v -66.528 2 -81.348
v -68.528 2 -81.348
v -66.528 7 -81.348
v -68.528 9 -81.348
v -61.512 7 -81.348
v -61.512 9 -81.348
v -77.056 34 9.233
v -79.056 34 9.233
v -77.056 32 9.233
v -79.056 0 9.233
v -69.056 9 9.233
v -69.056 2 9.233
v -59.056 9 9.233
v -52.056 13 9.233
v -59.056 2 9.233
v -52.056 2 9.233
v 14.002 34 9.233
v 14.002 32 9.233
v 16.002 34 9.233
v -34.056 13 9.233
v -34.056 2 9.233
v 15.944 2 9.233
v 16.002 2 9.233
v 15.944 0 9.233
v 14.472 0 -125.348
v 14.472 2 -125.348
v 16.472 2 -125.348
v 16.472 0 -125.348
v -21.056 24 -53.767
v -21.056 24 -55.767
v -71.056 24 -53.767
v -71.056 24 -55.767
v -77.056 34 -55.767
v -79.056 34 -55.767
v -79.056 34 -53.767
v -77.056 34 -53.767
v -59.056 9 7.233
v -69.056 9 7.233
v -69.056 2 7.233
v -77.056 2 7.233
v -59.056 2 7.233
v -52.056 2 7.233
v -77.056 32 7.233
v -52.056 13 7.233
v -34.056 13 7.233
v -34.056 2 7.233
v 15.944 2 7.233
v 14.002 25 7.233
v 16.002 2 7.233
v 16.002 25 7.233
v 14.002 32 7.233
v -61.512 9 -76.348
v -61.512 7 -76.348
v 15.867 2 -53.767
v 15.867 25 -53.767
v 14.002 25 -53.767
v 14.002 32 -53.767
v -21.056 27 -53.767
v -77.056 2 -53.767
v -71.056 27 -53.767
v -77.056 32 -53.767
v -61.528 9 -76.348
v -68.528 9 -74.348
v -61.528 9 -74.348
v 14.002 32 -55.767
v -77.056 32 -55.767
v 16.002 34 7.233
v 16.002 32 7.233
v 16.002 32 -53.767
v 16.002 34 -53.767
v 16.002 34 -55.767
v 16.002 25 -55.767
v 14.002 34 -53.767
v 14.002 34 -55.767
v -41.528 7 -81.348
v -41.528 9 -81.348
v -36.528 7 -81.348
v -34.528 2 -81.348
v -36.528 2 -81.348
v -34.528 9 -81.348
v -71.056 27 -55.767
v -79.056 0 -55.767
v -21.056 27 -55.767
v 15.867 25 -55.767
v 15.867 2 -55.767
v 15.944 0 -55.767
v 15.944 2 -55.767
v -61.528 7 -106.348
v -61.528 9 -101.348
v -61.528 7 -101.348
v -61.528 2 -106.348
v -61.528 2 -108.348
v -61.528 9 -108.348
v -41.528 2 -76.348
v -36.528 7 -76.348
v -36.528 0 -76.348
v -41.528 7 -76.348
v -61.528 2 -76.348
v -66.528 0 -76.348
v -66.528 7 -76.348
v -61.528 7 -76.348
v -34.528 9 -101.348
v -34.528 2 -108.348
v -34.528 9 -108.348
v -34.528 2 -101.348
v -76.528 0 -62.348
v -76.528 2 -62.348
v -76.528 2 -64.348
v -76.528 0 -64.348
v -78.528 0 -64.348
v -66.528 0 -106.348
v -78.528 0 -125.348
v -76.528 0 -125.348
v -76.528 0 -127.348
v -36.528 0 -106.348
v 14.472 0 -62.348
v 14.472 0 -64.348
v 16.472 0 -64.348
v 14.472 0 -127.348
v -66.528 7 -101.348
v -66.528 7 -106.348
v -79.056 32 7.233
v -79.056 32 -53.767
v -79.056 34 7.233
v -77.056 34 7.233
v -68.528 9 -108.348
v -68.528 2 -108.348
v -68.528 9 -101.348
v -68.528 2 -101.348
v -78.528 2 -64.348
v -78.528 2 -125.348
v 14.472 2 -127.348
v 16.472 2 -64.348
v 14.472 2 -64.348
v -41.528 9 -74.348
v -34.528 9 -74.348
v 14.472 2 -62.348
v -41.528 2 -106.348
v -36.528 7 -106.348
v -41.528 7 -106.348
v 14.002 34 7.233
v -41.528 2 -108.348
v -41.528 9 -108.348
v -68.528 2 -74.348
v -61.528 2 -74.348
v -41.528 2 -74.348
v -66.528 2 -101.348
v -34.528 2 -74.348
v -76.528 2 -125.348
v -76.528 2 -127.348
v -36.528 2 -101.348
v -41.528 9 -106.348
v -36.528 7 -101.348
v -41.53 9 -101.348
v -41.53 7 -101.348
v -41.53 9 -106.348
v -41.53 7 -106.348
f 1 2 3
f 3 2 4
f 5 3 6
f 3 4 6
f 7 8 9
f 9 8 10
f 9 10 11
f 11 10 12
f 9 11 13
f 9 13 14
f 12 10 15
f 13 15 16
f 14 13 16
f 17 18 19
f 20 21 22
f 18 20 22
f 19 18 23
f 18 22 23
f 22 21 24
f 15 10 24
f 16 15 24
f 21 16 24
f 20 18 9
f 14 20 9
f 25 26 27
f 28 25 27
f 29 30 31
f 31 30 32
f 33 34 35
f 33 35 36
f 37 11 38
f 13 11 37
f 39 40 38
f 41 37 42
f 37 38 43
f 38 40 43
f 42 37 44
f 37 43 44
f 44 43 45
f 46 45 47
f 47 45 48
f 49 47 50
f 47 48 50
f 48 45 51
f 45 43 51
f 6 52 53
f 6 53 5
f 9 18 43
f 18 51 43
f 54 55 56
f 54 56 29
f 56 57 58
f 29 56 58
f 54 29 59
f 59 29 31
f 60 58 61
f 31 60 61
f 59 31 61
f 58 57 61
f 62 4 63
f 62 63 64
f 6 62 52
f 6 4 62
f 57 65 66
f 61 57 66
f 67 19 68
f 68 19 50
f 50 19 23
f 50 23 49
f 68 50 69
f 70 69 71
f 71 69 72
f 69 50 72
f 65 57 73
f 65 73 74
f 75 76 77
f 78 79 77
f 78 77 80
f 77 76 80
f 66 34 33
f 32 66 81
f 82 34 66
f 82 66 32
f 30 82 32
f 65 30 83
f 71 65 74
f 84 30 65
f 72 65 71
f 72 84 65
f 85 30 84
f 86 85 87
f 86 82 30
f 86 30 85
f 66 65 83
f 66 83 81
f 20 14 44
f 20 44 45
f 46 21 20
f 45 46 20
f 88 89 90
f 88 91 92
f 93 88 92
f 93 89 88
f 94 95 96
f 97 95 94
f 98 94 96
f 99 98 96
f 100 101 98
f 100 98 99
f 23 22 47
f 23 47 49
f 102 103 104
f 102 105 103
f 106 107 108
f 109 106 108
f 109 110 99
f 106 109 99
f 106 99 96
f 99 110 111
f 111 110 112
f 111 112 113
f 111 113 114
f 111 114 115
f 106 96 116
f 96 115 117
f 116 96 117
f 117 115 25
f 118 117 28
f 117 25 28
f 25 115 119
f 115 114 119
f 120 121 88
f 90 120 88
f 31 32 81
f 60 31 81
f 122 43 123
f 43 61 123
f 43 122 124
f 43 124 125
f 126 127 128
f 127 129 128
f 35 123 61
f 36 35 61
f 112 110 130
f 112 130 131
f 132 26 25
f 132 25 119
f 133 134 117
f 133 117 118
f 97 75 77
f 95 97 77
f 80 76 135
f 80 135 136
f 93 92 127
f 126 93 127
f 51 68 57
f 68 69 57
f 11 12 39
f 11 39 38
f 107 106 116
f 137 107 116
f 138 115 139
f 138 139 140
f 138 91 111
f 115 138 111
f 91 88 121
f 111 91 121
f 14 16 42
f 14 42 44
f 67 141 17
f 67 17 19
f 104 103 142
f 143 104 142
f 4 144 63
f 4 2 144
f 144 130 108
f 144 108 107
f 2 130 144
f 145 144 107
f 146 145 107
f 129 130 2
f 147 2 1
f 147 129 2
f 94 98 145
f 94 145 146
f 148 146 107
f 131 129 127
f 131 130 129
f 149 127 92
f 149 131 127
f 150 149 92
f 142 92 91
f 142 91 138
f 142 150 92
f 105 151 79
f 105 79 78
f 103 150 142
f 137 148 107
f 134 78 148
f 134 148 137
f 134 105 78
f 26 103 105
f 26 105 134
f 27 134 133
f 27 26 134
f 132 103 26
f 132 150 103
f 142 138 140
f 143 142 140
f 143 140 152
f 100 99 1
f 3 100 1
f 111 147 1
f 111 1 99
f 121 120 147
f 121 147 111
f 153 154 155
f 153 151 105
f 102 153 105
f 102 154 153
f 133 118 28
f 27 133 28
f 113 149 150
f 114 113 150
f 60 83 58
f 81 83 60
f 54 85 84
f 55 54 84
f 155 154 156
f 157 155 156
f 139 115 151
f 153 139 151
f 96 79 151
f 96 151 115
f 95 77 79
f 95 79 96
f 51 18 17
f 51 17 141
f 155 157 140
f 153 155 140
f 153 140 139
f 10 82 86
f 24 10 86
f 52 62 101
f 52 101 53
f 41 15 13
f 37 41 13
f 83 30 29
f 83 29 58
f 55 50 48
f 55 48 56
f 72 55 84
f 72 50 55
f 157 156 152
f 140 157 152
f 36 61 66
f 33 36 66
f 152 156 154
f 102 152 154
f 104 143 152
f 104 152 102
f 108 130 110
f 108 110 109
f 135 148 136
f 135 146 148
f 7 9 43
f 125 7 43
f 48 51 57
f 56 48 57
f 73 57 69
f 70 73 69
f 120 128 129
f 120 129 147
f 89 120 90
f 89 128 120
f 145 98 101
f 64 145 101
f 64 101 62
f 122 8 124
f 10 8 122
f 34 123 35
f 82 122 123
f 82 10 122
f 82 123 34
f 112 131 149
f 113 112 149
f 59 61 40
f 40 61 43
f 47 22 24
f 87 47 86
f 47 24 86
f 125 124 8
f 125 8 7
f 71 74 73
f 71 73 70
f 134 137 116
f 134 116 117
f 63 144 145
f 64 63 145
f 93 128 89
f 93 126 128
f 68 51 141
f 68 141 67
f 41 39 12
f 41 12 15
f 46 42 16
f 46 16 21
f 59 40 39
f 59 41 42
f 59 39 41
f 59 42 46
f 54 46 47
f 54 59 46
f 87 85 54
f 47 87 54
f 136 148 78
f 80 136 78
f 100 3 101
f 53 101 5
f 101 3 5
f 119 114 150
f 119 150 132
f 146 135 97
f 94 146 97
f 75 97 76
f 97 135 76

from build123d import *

# Parameters (mm, degrees)
ESQUISSE1_W                = 95
ESQUISSE1_H                = 65
BOSS_EXTRU_1_DEPTH         = 2
ESQUISSE22_W               = 65
ESQUISSE22_H               = 30
BOSS_EXTRU_6_DEPTH         = 2
ESQUISSE23_W               = 93.058073386
ESQUISSE23_H               = 30
BOSS_EXTRU_7_DEPTH         = 2
ESQUISSE26_W               = 92.923280672
ESQUISSE26_H               = 30
BOSS_EXTRU_8_DEPTH         = 2
ESQUISSE27_W               = 10
ESQUISSE27_H               = 7
ENL_V_MAT_EXTRU_4_DEPTH    = 2
ESQUISSE28_W               = 18
ESQUISSE28_H               = 11
ENL_V_MAT_EXTRU_5_DEPTH    = 2
ESQUISSE30_W               = 65
ESQUISSE30_H               = 7
BOSS_EXTRU_9_DEPTH         = 2
ESQUISSE31_W               = 95
ESQUISSE31_H               = 65
BOSS_EXTRU_11_DEPTH        = 2
ESQUISSE32_W               = 2
ESQUISSE32_H               = 2
BOSS_EXTRU_12_DEPTH        = 2
R_P_TITION_LIN_AIRE1_COUNT = 2
R_P_TITION_LIN_AIRE1_PITCH = 63
ESQUISSE33_W               = 2
ESQUISSE33_H               = 2
BOSS_EXTRU_13_DEPTH        = 2
R_P_TITION_LIN_AIRE4_COUNT = 2
R_P_TITION_LIN_AIRE4_PITCH = 63
ESQUISSE34_W               = 2
ESQUISSE34_H               = 2
ENL_V_MAT_EXTRU_6_DEPTH    = 2
R_P_TITION_LIN_AIRE5_COUNT = 2
R_P_TITION_LIN_AIRE5_PITCH = 63
ESQUISSE35_W               = 2
ESQUISSE35_H               = 2
ENL_V_MAT_EXTRU_7_DEPTH    = 2
R_P_TITION_LIN_AIRE7_COUNT = 2
R_P_TITION_LIN_AIRE7_PITCH = 63
ESQUISSE36_W               = 30
ESQUISSE36_H               = 30
ENL_V_MAT_EXTRU_8_DEPTH    = 2
ESQUISSE37_W               = 5
ESQUISSE37_H               = 7
BOSS_EXTRU_14_DEPTH        = 2
ESQUISSE38_W               = 7
ESQUISSE38_H               = 7
BOSS_EXTRU_15_DEPTH        = 2
ESQUISSE39_W               = 5
ESQUISSE39_H               = 5
BOSS_EXTRU_16_DEPTH        = 2
ESQUISSE40_W               = 5
ESQUISSE40_H               = 7
BOSS_EXTRU_17_DEPTH        = 2
ESQUISSE41_W               = 7
ESQUISSE41_H               = 7
BOSS_EXTRU_19_DEPTH        = 2
ESQUISSE43_W               = 5.015402863
ESQUISSE43_H               = 5
BOSS_EXTRU_20_DEPTH        = 2
ESQUISSE44_W               = 5
ESQUISSE44_H               = 7
BOSS_EXTRU_21_DEPTH        = 2
ESQUISSE45_W               = 7
ESQUISSE45_H               = 7
BOSS_EXTRU_22_DEPTH        = 2
ESQUISSE46_W               = 5.00193494
ESQUISSE46_H               = 5
BOSS_EXTRU_23_DEPTH        = 2
ESQUISSE48_W               = 5
ESQUISSE48_H               = 7
BOSS_EXTRU_24_DEPTH        = 2
ESQUISSE49_W               = 7
ESQUISSE49_H               = 7
BOSS_EXTRU_25_DEPTH        = 2
ESQUISSE50_W               = 5
ESQUISSE50_H               = 5
BOSS_EXTRU_26_DEPTH        = 2
ESQUISSE51_W               = 50
ESQUISSE51_H               = 3
ENL_V_MAT_EXTRU_9_DEPTH    = 2


with BuildPart() as part:
    # Esquisse1 → Boss.-Extru.1 (new body)
    with BuildSketch(Plane(origin=(0, 0, 0), x_dir=(1, 0, 0), z_dir=(0, 1, 0))):
        with Locations((-31.555880748, 23.267126069)):
            Rectangle(ESQUISSE1_W, ESQUISSE1_H)
    extrude(amount=BOSS_EXTRU_1_DEPTH)

    # Esquisse22 → Boss.-Extru.6 (add)
    with BuildSketch(Plane.ZY.offset(79.055880748)):
        with Locations((-23.267126069, 17)):
            Rectangle(ESQUISSE22_W, ESQUISSE22_H)
    extrude(amount=-BOSS_EXTRU_6_DEPTH)

    # Esquisse23 → Boss.-Extru.7 (add)
    with BuildSketch(Plane.XY.offset(9.232873931)):
        with Locations((-30.526844055, 17)):
            Rectangle(ESQUISSE23_W, ESQUISSE23_H)
    extrude(amount=-BOSS_EXTRU_7_DEPTH)

    # Esquisse26 → Boss.-Extru.8 (add)
    with BuildSketch(Plane(origin=(0, 0, -55.767126069), x_dir=(-1, 0, 0), z_dir=(0, 0, -1))):
        with Locations((30.594240412, 17)):
            Rectangle(ESQUISSE26_W, ESQUISSE26_H)
    extrude(amount=-BOSS_EXTRU_8_DEPTH)

    # Esquisse27 → Enlèv. mat.-Extru.4 (cut)
    with BuildSketch(Plane.XY.offset(9.232873931)):
        with Locations((-64.055880748, 5.5)):
            Rectangle(ESQUISSE27_W, ESQUISSE27_H)
    extrude(amount=-ENL_V_MAT_EXTRU_4_DEPTH, mode=Mode.SUBTRACT)

    # Esquisse28 → Enlèv. mat.-Extru.5 (cut)
    with BuildSketch(Plane.XY.offset(9.232873931)):
        with Locations((-43.055880748, 7.5)):
            Rectangle(ESQUISSE28_W, ESQUISSE28_H)
    extrude(amount=-ENL_V_MAT_EXTRU_5_DEPTH, mode=Mode.SUBTRACT)

    # Esquisse30 → Boss.-Extru.9 (add)
    with BuildSketch(Plane(origin=(16.002192638, 0, 0), x_dir=(0, 0, -1), z_dir=(1, 0, 0))):
        with Locations((23.267126069, 28.5)):
            Rectangle(ESQUISSE30_W, ESQUISSE30_H)
    extrude(amount=-BOSS_EXTRU_9_DEPTH)

    # Esquisse32 → Boss.-Extru.12 (add)
    with BuildSketch(Plane(origin=(0, 32, 0), x_dir=(1, 0, 0), z_dir=(0, 1, 0))):
        with Locations((-78.055880748, 54.767126069)):
            Rectangle(ESQUISSE32_W, ESQUISSE32_H)
    boss_extru_12 = extrude(amount=BOSS_EXTRU_12_DEPTH)

    # Répétition linéaire1: Boss.-Extru.12 ×2
    with Locations(*[(0, 0, i * R_P_TITION_LIN_AIRE1_PITCH) for i in range(1, R_P_TITION_LIN_AIRE1_COUNT)]):
        add(boss_extru_12)

    # Esquisse33 → Boss.-Extru.13 (add)
    with BuildSketch(Plane(origin=(0, 32, 0), x_dir=(1, 0, 0), z_dir=(0, 1, 0))):
        with Locations((15.002192638, 54.767126069)):
            Rectangle(ESQUISSE33_W, ESQUISSE33_H)
    boss_extru_13 = extrude(amount=BOSS_EXTRU_13_DEPTH)

    # Répétition linéaire4: Boss.-Extru.13 ×2
    with Locations(*[(0, 0, i * R_P_TITION_LIN_AIRE4_PITCH) for i in range(1, R_P_TITION_LIN_AIRE4_COUNT)]):
        add(boss_extru_13)

    # Esquisse51 → Enlèv. mat.-Extru.9 (cut)
    with BuildSketch(Plane(origin=(0, 0, -55.767126069), x_dir=(-1, 0, 0), z_dir=(0, 0, -1))):
        with Locations((46.055880748, 25.5)):
            Rectangle(ESQUISSE51_W, ESQUISSE51_H)
    extrude(amount=-ENL_V_MAT_EXTRU_9_DEPTH, mode=Mode.SUBTRACT)


with BuildPart() as body_2:
    # Esquisse31 → Boss.-Extru.11 (new body)
    with BuildSketch(Plane(origin=(0, 0, 0), x_dir=(1, 0, 0), z_dir=(0, 1, 0))):
        with Locations((-31.027576349, 94.847888589)):
            Rectangle(ESQUISSE31_W, ESQUISSE31_H)
    extrude(amount=BOSS_EXTRU_11_DEPTH)

    # Esquisse34 → Enlèv. mat.-Extru.6 (cut)
    with BuildSketch(Plane(origin=(0, 2, 0), x_dir=(1, 0, 0), z_dir=(0, 1, 0))):
        with Locations((-77.527576349, 126.347888589)):
            Rectangle(ESQUISSE34_W, ESQUISSE34_H)
    enl_v_mat_extru_6 = extrude(amount=-ENL_V_MAT_EXTRU_6_DEPTH, mode=Mode.SUBTRACT)

    # Répétition linéaire5: Enlèv. mat.-Extru.6 ×2
    with Locations(*[(0, 0, i * R_P_TITION_LIN_AIRE5_PITCH) for i in range(1, R_P_TITION_LIN_AIRE5_COUNT)]):
        add(enl_v_mat_extru_6, mode=Mode.SUBTRACT)

    # Esquisse35 → Enlèv. mat.-Extru.7 (cut)
    with BuildSketch(Plane(origin=(0, 2, 0), x_dir=(1, 0, 0), z_dir=(0, 1, 0))):
        with Locations((15.472423651, 126.347888589)):
            Rectangle(ESQUISSE35_W, ESQUISSE35_H)
    enl_v_mat_extru_7 = extrude(amount=-ENL_V_MAT_EXTRU_7_DEPTH, mode=Mode.SUBTRACT)

    # Répétition linéaire7: Enlèv. mat.-Extru.7 ×2
    with Locations(*[(0, 0, i * R_P_TITION_LIN_AIRE7_PITCH) for i in range(1, R_P_TITION_LIN_AIRE7_COUNT)]):
        add(enl_v_mat_extru_7, mode=Mode.SUBTRACT)

    # Esquisse36 → Enlèv. mat.-Extru.8 (cut)
    with BuildSketch(Plane(origin=(0, 2, 0), x_dir=(1, 0, 0), z_dir=(0, 1, 0))):
        with Locations((-51.527576349, 91.347888589)):
            Rectangle(ESQUISSE36_W, ESQUISSE36_H)
    extrude(amount=-ENL_V_MAT_EXTRU_8_DEPTH, mode=Mode.SUBTRACT)

    # Esquisse37 → Boss.-Extru.14 (add)
    with BuildSketch(Plane(origin=(-66.527576349, 0, 0), x_dir=(0, 0, -1), z_dir=(1, 0, 0))):
        with Locations((103.847888589, 5.5)):
            Rectangle(ESQUISSE37_W, ESQUISSE37_H)
    extrude(amount=-BOSS_EXTRU_14_DEPTH)

    # Esquisse38 → Boss.-Extru.15 (add)
    with BuildSketch(Plane(origin=(0, 0, -106.347888589), x_dir=(-1, 0, 0), z_dir=(0, 0, -1))):
        with Locations((65.027576349, 5.5)):
            Rectangle(ESQUISSE38_W, ESQUISSE38_H)
    extrude(amount=BOSS_EXTRU_15_DEPTH)

    # Esquisse39 → Boss.-Extru.16 (add)
    with BuildSketch(Plane(origin=(0, 9, 0), x_dir=(1, 0, 0), z_dir=(0, 1, 0))):
        with Locations((-64.027576349, 103.847888589)):
            Rectangle(ESQUISSE39_W, ESQUISSE39_H)
    extrude(amount=-BOSS_EXTRU_16_DEPTH)

    # Esquisse40 → Boss.-Extru.17 (add)
    with BuildSketch(Plane(origin=(-66.527576349, 0, 0), x_dir=(0, 0, -1), z_dir=(1, 0, 0))):
        with Locations((78.847888589, 5.5)):
            Rectangle(ESQUISSE40_W, ESQUISSE40_H)
    extrude(amount=-BOSS_EXTRU_17_DEPTH)

    # Esquisse41 → Boss.-Extru.19 (add)
    with BuildSketch(Plane.XY.offset(-76.347888589)):
        with Locations((-65.027576349, 5.5)):
            Rectangle(ESQUISSE41_W, ESQUISSE41_H)
    extrude(amount=BOSS_EXTRU_19_DEPTH)

    # Esquisse43 → Boss.-Extru.20 (add)
    with BuildSketch(Plane(origin=(0, 9, 0), x_dir=(1, 0, 0), z_dir=(0, 1, 0))):
        with Locations((-64.019874918, 78.847888589)):
            Rectangle(ESQUISSE43_W, ESQUISSE43_H)
    extrude(amount=-BOSS_EXTRU_20_DEPTH)

    # Esquisse44 → Boss.-Extru.21 (add)
    with BuildSketch(Plane.ZY.offset(36.527576349)):
        with Locations((-103.847888589, 5.5)):
            Rectangle(ESQUISSE44_W, ESQUISSE44_H)
    extrude(amount=-BOSS_EXTRU_21_DEPTH)

    # Esquisse45 → Boss.-Extru.22 (add)
    with BuildSketch(Plane(origin=(0, 0, -106.347888589), x_dir=(-1, 0, 0), z_dir=(0, 0, -1))):
        with Locations((38.027576349, 5.5)):
            Rectangle(ESQUISSE45_W, ESQUISSE45_H)
    extrude(amount=BOSS_EXTRU_22_DEPTH)

    # Esquisse46 → Boss.-Extru.23 (add)
    with BuildSketch(Plane(origin=(0, 9, 0), x_dir=(1, 0, 0), z_dir=(0, 1, 0))):
        with Locations((-39.028543819, 103.847888589)):
            Rectangle(ESQUISSE46_W, ESQUISSE46_H)
    extrude(amount=-BOSS_EXTRU_23_DEPTH)

    # Esquisse48 → Boss.-Extru.24 (add)
    with BuildSketch(Plane(origin=(0, 0, -76.347888589), x_dir=(-1, 0, 0), z_dir=(0, 0, -1))):
        with Locations((39.027576349, 5.5)):
            Rectangle(ESQUISSE48_W, ESQUISSE48_H)
    extrude(amount=-BOSS_EXTRU_24_DEPTH)

    # Esquisse49 → Boss.-Extru.25 (add)
    with BuildSketch(Plane(origin=(-36.527576349, 0, 0), x_dir=(0, 0, -1), z_dir=(1, 0, 0))):
        with Locations((77.847888589, 5.5)):
            Rectangle(ESQUISSE49_W, ESQUISSE49_H)
    extrude(amount=BOSS_EXTRU_25_DEPTH)

    # Esquisse50 → Boss.-Extru.26 (add)
    with BuildSketch(Plane(origin=(0, 9, 0), x_dir=(1, 0, 0), z_dir=(0, 1, 0))):
        with Locations((-39.027576349, 78.847888589)):
            Rectangle(ESQUISSE50_W, ESQUISSE50_H)
    extrude(amount=-BOSS_EXTRU_26_DEPTH)


solid = Compound([part.part, body_2.part])
